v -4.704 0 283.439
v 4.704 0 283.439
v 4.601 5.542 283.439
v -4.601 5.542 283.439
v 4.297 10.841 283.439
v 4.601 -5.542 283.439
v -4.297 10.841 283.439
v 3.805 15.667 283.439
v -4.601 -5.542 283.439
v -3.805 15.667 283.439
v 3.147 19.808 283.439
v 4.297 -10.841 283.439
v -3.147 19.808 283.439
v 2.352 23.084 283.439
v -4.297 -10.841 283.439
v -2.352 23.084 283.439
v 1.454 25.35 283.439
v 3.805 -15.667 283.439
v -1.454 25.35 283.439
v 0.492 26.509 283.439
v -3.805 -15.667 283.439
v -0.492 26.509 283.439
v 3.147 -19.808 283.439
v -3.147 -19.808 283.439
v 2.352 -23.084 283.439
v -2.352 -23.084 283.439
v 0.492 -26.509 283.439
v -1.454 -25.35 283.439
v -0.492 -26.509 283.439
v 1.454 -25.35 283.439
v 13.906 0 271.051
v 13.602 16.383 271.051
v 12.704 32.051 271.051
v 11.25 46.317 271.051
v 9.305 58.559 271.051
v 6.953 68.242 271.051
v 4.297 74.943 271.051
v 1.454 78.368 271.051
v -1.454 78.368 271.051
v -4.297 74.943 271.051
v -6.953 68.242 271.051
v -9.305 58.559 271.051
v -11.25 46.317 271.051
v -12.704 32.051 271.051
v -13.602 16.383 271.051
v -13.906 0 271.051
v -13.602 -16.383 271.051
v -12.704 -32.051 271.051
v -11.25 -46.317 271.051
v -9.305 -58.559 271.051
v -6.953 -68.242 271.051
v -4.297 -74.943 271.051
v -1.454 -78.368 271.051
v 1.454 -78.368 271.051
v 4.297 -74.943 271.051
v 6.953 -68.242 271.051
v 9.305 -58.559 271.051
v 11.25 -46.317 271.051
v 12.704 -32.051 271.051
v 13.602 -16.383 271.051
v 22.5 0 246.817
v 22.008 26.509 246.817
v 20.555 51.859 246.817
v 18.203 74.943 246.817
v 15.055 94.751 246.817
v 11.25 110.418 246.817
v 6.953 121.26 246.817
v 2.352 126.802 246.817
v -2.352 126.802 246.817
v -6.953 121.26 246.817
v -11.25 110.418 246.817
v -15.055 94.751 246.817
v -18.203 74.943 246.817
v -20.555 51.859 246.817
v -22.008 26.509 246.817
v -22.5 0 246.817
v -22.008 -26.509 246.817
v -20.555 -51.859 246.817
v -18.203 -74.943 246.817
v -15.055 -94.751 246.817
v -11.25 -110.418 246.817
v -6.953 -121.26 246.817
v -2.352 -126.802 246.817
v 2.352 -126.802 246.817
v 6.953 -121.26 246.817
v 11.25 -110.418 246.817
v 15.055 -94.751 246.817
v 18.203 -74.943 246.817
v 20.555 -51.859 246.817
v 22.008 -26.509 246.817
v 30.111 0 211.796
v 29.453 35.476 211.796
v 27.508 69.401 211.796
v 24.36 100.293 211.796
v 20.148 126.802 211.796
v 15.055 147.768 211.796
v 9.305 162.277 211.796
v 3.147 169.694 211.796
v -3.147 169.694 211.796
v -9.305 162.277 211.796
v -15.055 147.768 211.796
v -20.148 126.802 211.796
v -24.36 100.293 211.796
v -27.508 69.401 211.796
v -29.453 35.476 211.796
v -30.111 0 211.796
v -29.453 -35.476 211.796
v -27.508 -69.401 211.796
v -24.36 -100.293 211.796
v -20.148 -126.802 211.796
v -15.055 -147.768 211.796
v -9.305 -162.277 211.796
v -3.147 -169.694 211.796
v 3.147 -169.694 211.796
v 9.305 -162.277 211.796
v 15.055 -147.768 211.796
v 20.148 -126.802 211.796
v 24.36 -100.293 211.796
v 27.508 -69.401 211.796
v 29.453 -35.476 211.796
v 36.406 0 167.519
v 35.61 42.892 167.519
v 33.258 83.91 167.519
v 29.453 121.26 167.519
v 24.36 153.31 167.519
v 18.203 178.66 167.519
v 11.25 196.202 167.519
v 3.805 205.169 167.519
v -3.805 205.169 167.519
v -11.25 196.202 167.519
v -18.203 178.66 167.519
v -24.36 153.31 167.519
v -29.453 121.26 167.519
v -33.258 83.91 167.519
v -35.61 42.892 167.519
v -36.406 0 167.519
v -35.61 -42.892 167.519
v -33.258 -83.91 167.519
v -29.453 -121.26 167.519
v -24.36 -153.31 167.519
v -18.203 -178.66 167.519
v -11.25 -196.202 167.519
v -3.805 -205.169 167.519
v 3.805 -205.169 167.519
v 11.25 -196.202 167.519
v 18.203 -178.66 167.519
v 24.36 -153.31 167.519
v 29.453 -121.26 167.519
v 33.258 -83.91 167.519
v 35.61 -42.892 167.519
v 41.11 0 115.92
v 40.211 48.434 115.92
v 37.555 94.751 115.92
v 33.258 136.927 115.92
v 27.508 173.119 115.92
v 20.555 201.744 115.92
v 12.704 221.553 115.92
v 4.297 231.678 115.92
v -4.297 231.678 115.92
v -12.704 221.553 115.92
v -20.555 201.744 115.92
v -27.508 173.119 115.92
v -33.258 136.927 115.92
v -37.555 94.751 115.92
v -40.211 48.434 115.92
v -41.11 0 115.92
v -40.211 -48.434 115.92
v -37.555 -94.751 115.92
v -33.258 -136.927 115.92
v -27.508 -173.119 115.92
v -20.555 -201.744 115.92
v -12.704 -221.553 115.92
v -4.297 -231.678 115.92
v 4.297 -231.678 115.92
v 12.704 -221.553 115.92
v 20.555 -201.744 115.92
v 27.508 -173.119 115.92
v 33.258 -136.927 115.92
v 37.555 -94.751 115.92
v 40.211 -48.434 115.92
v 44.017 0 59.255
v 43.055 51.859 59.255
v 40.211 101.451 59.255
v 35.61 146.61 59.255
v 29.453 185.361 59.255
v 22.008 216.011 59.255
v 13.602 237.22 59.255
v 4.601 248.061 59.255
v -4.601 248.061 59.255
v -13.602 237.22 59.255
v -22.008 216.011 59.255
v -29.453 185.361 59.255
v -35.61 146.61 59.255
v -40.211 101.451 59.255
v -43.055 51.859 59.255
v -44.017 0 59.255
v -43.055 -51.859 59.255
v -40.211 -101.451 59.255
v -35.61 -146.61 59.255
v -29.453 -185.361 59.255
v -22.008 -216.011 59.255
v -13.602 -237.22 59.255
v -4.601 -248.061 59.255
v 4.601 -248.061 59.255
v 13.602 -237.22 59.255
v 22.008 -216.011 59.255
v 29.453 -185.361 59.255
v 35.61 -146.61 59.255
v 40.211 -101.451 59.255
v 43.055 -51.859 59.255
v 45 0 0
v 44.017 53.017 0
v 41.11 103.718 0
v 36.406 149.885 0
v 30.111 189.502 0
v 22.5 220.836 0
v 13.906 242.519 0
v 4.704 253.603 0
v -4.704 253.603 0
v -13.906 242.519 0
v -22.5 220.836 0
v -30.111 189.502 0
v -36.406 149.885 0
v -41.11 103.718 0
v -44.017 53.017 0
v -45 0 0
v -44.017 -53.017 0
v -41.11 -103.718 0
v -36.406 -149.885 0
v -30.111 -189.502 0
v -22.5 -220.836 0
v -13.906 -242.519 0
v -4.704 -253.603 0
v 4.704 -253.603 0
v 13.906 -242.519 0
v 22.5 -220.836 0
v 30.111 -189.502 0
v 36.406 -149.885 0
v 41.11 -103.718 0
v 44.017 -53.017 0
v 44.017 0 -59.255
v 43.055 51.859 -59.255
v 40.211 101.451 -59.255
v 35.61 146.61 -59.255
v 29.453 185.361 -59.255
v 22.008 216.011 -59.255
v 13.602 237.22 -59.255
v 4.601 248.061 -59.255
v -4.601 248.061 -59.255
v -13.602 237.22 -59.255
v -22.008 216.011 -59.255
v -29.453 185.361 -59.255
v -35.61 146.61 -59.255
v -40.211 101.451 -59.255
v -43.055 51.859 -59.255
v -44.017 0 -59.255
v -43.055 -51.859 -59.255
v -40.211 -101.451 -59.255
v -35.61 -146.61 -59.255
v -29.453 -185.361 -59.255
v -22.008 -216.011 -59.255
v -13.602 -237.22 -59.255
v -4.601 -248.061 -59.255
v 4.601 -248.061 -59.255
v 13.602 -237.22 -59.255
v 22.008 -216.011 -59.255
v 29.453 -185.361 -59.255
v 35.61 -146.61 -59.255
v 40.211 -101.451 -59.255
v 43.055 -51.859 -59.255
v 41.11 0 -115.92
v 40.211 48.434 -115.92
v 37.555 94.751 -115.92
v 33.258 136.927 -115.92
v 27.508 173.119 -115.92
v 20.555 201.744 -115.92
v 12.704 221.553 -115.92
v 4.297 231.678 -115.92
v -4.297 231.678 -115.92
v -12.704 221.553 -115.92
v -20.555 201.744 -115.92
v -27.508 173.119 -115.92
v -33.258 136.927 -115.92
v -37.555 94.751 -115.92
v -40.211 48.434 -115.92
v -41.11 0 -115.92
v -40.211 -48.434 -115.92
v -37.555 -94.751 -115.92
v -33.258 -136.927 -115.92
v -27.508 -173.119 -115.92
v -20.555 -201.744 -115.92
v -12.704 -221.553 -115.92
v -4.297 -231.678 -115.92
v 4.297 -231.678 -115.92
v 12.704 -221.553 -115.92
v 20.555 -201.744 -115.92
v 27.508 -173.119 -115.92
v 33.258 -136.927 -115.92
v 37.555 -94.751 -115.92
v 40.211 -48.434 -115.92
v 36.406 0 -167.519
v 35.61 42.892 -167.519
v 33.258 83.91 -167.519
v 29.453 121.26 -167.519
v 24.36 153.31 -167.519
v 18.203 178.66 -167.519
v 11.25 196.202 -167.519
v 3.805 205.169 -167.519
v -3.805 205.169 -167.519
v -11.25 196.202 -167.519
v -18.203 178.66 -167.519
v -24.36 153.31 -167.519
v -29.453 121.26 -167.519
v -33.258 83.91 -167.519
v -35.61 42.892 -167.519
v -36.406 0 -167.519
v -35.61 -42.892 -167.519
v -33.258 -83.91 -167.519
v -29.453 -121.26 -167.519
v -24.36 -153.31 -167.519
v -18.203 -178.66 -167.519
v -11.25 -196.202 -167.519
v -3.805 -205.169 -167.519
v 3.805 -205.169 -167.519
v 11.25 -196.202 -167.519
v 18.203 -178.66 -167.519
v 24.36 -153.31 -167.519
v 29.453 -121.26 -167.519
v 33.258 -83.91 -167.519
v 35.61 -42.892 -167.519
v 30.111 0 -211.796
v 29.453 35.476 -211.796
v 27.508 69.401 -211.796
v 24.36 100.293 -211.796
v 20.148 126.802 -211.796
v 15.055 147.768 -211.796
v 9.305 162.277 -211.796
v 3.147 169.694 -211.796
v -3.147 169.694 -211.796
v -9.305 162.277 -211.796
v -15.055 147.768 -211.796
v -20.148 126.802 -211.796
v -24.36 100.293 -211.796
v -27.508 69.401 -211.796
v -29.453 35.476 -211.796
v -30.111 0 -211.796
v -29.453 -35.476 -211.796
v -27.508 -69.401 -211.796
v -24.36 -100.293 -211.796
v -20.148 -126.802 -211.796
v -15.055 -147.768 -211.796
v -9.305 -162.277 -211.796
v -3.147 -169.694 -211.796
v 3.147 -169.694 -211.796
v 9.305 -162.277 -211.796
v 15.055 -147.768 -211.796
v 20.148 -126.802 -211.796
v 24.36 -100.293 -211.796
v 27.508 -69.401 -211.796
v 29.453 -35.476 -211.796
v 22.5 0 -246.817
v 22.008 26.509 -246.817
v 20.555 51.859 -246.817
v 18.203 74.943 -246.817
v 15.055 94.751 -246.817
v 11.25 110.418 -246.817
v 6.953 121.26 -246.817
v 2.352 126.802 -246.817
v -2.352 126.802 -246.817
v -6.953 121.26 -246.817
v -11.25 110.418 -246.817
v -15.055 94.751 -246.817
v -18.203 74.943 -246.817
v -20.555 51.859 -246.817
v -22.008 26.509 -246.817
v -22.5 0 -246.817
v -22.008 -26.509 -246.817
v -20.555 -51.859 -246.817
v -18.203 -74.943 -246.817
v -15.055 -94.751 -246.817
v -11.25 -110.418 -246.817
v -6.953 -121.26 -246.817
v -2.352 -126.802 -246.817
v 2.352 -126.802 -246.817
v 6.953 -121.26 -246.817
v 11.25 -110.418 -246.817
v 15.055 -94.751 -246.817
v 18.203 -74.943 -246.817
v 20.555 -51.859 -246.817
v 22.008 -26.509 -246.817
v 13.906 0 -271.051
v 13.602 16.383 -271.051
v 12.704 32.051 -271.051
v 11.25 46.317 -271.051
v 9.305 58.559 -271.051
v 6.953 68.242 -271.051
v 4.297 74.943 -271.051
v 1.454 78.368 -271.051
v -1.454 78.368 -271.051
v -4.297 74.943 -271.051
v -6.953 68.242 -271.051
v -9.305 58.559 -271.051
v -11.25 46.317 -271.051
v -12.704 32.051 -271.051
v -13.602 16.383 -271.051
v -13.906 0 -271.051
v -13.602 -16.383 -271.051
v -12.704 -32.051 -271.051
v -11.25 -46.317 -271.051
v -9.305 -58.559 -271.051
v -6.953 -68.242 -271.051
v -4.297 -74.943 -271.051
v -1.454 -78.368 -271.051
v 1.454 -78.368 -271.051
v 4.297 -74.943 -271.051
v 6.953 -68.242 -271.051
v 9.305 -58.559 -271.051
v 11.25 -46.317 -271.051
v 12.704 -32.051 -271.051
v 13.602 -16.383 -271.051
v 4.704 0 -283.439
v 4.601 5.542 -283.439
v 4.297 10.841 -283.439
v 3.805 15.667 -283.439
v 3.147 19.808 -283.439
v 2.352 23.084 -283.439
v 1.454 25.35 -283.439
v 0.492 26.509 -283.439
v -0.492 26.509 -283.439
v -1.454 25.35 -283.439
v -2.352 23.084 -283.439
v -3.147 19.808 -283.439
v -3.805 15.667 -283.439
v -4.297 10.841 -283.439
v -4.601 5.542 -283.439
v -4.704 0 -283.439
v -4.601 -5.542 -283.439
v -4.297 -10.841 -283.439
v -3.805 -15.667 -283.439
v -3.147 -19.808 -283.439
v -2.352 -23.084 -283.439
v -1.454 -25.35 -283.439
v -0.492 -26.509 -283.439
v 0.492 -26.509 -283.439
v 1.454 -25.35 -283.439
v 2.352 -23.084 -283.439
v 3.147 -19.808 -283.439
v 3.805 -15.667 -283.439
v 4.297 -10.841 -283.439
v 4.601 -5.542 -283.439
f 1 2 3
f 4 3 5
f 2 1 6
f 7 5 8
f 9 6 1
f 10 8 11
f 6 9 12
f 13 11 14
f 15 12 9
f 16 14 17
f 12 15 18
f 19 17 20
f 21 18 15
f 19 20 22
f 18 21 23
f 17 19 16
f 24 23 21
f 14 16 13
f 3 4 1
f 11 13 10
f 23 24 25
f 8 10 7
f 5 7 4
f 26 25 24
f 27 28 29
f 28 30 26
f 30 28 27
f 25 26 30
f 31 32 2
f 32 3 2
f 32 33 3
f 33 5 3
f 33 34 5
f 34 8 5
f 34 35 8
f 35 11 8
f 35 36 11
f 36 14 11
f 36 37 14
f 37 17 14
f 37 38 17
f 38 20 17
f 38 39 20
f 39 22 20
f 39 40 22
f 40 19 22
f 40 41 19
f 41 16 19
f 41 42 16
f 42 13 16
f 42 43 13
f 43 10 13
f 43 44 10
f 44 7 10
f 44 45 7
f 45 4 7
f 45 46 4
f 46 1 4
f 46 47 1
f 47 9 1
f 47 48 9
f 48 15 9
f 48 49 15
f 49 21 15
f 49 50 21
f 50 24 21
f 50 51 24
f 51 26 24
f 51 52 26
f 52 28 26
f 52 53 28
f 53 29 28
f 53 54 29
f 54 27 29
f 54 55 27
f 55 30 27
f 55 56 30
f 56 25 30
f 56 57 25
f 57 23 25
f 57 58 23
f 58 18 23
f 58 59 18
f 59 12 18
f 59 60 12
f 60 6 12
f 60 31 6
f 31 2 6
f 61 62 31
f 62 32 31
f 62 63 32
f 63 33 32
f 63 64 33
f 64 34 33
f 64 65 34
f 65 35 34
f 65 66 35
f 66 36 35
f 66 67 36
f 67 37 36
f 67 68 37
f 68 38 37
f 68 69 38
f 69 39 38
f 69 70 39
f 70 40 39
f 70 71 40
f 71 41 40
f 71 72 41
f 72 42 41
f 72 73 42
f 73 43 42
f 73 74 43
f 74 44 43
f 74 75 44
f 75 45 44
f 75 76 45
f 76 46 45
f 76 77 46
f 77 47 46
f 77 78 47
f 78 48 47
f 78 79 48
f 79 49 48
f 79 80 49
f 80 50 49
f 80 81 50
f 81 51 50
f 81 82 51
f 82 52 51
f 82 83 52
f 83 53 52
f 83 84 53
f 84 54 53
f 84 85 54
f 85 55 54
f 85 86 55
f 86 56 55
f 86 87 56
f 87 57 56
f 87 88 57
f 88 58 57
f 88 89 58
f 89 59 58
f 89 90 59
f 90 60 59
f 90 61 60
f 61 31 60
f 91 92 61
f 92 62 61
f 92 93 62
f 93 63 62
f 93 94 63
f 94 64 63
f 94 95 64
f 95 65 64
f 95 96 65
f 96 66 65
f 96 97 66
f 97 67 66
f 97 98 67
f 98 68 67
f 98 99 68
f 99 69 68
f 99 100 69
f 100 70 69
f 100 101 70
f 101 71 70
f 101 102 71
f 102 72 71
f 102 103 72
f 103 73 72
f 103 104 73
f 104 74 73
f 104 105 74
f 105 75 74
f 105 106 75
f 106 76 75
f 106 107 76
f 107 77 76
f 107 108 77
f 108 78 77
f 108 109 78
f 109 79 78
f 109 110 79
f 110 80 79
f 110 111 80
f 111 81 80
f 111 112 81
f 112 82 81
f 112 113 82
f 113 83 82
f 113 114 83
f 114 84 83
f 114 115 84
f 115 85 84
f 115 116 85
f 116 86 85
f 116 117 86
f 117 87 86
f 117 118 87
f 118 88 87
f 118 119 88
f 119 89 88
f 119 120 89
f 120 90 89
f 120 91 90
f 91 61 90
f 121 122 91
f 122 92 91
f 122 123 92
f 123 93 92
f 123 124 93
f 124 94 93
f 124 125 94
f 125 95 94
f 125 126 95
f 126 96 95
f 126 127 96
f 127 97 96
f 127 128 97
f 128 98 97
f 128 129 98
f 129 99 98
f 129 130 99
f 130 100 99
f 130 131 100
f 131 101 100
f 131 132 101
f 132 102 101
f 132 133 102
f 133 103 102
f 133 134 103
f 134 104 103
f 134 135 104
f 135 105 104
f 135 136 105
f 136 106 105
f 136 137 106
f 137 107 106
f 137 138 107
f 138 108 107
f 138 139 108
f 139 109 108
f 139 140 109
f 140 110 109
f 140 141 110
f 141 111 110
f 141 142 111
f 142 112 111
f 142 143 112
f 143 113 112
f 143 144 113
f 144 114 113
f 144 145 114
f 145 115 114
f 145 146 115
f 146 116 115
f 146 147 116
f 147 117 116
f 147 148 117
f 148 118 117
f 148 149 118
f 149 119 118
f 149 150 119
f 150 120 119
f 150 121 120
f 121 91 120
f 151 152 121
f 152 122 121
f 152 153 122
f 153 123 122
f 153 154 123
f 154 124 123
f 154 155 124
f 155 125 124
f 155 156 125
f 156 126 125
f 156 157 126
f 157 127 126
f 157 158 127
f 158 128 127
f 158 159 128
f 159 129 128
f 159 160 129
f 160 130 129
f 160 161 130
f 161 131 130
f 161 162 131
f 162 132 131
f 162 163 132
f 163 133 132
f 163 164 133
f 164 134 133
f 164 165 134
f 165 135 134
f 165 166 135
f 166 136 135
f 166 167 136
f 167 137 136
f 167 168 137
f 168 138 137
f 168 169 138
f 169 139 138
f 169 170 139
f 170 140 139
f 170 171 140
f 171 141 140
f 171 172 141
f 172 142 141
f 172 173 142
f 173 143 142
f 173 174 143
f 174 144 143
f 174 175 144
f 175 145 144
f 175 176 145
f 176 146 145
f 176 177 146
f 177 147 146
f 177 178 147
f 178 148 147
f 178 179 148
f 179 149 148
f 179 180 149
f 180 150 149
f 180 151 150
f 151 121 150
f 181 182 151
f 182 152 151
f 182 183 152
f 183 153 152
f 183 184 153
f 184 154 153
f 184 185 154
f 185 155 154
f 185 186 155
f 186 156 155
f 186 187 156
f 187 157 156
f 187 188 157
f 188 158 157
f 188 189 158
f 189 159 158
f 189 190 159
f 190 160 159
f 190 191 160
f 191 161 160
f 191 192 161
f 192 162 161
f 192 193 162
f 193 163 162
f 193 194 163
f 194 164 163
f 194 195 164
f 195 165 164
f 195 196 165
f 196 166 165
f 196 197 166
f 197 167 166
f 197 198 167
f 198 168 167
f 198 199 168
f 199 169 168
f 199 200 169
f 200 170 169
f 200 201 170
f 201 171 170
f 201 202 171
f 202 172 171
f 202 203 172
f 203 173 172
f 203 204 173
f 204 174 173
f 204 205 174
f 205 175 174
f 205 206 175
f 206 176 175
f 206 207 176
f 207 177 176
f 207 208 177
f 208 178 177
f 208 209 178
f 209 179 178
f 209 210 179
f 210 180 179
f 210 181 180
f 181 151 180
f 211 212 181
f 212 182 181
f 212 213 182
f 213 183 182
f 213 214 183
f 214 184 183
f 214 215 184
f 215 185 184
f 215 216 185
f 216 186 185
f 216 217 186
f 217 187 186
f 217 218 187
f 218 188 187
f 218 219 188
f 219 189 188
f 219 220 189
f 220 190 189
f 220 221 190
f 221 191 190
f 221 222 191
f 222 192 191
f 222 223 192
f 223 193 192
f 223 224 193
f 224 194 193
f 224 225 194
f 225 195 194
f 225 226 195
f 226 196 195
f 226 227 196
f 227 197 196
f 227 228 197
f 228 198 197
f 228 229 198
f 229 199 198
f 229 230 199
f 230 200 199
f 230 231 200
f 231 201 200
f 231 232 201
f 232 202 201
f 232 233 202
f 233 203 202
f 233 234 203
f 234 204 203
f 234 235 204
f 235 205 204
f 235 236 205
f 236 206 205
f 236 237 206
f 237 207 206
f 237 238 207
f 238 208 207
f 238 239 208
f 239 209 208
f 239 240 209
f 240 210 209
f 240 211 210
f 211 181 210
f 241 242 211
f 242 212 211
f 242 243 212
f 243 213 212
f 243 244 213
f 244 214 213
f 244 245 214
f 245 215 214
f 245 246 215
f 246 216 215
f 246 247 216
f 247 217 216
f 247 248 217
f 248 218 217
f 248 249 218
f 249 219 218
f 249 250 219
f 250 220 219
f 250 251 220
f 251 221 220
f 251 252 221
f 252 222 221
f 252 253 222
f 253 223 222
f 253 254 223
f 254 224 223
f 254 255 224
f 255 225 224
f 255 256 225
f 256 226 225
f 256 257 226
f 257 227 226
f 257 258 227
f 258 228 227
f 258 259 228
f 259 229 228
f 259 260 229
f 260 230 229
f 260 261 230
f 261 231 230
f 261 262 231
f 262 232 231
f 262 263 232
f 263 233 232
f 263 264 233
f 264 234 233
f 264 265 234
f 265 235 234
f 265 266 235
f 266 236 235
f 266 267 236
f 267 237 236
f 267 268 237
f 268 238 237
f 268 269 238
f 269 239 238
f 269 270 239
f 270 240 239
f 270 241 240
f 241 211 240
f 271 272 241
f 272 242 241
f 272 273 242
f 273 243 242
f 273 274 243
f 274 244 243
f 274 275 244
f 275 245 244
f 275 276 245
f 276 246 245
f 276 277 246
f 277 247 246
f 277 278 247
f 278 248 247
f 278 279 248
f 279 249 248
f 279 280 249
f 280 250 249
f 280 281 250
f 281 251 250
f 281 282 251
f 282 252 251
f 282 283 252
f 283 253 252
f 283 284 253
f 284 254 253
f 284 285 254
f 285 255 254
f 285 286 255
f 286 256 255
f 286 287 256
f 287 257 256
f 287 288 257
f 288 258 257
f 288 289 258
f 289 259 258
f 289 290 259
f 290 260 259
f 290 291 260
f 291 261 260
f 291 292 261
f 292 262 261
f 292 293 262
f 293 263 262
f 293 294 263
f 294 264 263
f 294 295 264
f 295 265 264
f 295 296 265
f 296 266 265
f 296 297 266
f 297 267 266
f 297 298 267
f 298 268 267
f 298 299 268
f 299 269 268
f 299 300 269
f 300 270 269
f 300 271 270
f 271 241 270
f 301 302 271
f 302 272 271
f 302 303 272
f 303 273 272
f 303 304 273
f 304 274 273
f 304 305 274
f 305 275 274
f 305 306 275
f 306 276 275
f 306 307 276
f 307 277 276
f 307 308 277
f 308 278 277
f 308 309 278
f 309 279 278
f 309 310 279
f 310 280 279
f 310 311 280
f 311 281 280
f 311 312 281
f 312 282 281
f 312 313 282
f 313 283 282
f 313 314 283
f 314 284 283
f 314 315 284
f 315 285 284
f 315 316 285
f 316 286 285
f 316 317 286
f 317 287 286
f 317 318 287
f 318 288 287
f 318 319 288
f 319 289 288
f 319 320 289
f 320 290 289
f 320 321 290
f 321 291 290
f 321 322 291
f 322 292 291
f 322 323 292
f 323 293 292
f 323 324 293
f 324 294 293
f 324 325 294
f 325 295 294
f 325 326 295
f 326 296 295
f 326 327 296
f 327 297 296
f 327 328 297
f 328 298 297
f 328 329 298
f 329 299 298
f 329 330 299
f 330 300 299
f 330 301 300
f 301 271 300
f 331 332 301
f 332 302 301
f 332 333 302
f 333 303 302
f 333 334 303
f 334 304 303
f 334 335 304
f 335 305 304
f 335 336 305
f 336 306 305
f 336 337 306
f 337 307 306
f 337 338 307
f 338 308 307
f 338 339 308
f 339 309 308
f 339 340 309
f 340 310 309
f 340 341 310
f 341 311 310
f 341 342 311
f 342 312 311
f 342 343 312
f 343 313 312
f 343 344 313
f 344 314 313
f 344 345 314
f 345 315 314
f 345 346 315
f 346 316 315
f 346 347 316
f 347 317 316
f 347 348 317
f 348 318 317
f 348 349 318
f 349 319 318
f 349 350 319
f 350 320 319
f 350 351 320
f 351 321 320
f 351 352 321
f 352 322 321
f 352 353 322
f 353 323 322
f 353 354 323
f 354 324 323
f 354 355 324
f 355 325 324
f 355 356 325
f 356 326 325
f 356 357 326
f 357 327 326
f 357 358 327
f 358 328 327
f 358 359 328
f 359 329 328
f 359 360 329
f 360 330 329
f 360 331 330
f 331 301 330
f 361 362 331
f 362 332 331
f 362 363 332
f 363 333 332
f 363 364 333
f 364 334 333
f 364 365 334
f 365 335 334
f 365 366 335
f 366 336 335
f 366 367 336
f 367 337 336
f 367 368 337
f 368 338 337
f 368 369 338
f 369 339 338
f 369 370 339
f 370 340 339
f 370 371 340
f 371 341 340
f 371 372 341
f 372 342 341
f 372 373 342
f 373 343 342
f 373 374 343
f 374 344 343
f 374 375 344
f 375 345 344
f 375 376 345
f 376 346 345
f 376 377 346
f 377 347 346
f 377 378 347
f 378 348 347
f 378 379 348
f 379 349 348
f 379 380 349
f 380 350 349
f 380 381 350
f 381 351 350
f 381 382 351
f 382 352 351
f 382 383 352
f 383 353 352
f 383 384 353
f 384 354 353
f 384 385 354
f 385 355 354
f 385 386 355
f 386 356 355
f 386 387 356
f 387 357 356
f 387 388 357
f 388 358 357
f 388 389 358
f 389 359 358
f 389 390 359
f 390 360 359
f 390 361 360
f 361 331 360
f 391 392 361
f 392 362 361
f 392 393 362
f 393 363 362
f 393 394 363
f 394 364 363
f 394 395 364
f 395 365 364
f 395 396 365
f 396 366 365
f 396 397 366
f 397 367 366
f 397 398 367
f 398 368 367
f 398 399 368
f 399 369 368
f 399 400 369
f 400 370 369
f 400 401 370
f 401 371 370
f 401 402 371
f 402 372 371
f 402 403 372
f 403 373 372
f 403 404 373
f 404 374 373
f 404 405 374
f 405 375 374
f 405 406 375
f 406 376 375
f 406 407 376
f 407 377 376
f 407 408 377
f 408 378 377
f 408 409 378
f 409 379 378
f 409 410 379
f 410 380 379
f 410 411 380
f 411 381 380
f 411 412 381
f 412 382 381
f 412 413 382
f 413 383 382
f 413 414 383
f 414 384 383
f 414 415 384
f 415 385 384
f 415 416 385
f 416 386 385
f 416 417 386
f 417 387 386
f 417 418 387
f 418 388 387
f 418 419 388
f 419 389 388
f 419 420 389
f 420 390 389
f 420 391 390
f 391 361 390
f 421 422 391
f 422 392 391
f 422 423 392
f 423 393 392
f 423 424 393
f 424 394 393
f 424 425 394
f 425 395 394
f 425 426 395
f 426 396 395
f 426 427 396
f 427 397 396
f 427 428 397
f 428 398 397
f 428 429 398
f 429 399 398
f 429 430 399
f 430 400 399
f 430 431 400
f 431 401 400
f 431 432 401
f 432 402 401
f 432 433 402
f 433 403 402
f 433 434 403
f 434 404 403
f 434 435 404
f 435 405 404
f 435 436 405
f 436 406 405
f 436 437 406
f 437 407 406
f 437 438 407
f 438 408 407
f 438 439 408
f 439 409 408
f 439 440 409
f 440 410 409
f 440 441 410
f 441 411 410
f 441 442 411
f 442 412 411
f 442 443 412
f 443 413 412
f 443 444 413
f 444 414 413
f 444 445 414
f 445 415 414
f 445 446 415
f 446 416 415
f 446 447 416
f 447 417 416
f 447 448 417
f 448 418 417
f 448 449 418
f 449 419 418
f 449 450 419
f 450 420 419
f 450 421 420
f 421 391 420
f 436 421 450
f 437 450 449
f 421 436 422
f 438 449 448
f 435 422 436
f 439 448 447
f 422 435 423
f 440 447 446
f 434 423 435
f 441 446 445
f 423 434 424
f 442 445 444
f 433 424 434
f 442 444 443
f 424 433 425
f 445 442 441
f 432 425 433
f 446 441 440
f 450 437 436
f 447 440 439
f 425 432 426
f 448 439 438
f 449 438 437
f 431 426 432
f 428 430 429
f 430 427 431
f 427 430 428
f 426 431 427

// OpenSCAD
// Generated by SolidPython 1.0.1 on 2020-07-29 00:46:46


scale(v = [3, 17, 19]) {
	sphere(r = 15);
}
/***********************************************
*********      SolidPython code:      **********
************************************************
 
# import packages: SolidPython
from solid import *
from solid.utils import *
from itertools import chain, combinations, permutations


class Resize:

    def __init__(self, scad_file):
        self.scad_file = scad_file
        #self.scad_file = import_scad(scad_file)
        # cone/cylinder param:
        self.r1 = 0
        self.r2 = 0
        self.h = 0
        # rectangular prism param:
        self.w = 0
        self.l = 0
        # ellipse param:
        self.r = 0

    # import OpenScad code (file name corresponds to shape)


    # classify shape + parameters
    def assign(self, param1, param2, param3):
        if self.scad_file == 'cone.scad':
            self.r1 = param1
            self.r2 = param2
            self.h = param3
        elif self.scad_file == 'cylinder.scad':
            self.r1 = param1
            self.r2 = param2
            self.h = param3
        elif self.scad_file == 'rectangularPrism.scad':
            self.h = param1
            self.l = param2
            self.w = param3
        else:
            self.r = param1
            self.h = param2

    # resize parameters
    def iterate(self):
        x = range(3, 20, 2)
        i = 1
        if self.scad_file == 'cone.scad':
            tempList = list(permutations(x, 2))
            for temp in tempList:
                param1 = temp[0]
                param2 = temp[1]
                filepath = 'produced_scad_files/' + 'cone' + str(param1) + '_' + str(param2) + '_' + '.scad'
                scad_render_to_file(cylinder(h=param1, r1=param2, r2=0), filepath)

        elif self.scad_file == 'cylinder.scad':
            tempList = list(permutations(x, 3))
            for temp in tempList:
                param1 = temp[0]
                param2 = temp[1]
                filepath = 'produced_scad_files/' + 'cylinder' + str(param1) + '_' + str(param2) + '_' + '.scad'
                scad_render_to_file(cylinder(h=param1, r1=param2, r2=param2), filepath)

        elif self.scad_file == 'rectangularPrism.scad':
            tempList = list(permutations(x, 3))
            for temp in tempList:
                param1 = temp[0]
                param2 = temp[1]
                param3 = temp[2]
                filepath = 'produced_scad_files/' + 'rectangularPrism' + str(param1) + '_' + str(param2) + '_' + str(
                    param3) + '.scad'
                scad_render_to_file(cube(size=(param1, param2, param3)), filepath)

        elif self.scad_file == 'ellipse.scad':
            tempList = list(permutations(x, 4))
            for temp in tempList:
                param1 = temp[0]
                param2 = temp[1]
                param3 = temp[2]
                param4 = temp[3]
                filepath = 'produced_scad_files/' + 'ellipse' + str(param1) + '_' + str(param2) + '_' + str(param3) + '_' + str(param4) + '.scad'
                scad_render_to_file(scale([param1, param2, param3])(sphere(r=param4)), filepath)

    def render_to_scadfile(self):
        scad_render_to_file(scad, 'example.scad') 
 
************************************************/
